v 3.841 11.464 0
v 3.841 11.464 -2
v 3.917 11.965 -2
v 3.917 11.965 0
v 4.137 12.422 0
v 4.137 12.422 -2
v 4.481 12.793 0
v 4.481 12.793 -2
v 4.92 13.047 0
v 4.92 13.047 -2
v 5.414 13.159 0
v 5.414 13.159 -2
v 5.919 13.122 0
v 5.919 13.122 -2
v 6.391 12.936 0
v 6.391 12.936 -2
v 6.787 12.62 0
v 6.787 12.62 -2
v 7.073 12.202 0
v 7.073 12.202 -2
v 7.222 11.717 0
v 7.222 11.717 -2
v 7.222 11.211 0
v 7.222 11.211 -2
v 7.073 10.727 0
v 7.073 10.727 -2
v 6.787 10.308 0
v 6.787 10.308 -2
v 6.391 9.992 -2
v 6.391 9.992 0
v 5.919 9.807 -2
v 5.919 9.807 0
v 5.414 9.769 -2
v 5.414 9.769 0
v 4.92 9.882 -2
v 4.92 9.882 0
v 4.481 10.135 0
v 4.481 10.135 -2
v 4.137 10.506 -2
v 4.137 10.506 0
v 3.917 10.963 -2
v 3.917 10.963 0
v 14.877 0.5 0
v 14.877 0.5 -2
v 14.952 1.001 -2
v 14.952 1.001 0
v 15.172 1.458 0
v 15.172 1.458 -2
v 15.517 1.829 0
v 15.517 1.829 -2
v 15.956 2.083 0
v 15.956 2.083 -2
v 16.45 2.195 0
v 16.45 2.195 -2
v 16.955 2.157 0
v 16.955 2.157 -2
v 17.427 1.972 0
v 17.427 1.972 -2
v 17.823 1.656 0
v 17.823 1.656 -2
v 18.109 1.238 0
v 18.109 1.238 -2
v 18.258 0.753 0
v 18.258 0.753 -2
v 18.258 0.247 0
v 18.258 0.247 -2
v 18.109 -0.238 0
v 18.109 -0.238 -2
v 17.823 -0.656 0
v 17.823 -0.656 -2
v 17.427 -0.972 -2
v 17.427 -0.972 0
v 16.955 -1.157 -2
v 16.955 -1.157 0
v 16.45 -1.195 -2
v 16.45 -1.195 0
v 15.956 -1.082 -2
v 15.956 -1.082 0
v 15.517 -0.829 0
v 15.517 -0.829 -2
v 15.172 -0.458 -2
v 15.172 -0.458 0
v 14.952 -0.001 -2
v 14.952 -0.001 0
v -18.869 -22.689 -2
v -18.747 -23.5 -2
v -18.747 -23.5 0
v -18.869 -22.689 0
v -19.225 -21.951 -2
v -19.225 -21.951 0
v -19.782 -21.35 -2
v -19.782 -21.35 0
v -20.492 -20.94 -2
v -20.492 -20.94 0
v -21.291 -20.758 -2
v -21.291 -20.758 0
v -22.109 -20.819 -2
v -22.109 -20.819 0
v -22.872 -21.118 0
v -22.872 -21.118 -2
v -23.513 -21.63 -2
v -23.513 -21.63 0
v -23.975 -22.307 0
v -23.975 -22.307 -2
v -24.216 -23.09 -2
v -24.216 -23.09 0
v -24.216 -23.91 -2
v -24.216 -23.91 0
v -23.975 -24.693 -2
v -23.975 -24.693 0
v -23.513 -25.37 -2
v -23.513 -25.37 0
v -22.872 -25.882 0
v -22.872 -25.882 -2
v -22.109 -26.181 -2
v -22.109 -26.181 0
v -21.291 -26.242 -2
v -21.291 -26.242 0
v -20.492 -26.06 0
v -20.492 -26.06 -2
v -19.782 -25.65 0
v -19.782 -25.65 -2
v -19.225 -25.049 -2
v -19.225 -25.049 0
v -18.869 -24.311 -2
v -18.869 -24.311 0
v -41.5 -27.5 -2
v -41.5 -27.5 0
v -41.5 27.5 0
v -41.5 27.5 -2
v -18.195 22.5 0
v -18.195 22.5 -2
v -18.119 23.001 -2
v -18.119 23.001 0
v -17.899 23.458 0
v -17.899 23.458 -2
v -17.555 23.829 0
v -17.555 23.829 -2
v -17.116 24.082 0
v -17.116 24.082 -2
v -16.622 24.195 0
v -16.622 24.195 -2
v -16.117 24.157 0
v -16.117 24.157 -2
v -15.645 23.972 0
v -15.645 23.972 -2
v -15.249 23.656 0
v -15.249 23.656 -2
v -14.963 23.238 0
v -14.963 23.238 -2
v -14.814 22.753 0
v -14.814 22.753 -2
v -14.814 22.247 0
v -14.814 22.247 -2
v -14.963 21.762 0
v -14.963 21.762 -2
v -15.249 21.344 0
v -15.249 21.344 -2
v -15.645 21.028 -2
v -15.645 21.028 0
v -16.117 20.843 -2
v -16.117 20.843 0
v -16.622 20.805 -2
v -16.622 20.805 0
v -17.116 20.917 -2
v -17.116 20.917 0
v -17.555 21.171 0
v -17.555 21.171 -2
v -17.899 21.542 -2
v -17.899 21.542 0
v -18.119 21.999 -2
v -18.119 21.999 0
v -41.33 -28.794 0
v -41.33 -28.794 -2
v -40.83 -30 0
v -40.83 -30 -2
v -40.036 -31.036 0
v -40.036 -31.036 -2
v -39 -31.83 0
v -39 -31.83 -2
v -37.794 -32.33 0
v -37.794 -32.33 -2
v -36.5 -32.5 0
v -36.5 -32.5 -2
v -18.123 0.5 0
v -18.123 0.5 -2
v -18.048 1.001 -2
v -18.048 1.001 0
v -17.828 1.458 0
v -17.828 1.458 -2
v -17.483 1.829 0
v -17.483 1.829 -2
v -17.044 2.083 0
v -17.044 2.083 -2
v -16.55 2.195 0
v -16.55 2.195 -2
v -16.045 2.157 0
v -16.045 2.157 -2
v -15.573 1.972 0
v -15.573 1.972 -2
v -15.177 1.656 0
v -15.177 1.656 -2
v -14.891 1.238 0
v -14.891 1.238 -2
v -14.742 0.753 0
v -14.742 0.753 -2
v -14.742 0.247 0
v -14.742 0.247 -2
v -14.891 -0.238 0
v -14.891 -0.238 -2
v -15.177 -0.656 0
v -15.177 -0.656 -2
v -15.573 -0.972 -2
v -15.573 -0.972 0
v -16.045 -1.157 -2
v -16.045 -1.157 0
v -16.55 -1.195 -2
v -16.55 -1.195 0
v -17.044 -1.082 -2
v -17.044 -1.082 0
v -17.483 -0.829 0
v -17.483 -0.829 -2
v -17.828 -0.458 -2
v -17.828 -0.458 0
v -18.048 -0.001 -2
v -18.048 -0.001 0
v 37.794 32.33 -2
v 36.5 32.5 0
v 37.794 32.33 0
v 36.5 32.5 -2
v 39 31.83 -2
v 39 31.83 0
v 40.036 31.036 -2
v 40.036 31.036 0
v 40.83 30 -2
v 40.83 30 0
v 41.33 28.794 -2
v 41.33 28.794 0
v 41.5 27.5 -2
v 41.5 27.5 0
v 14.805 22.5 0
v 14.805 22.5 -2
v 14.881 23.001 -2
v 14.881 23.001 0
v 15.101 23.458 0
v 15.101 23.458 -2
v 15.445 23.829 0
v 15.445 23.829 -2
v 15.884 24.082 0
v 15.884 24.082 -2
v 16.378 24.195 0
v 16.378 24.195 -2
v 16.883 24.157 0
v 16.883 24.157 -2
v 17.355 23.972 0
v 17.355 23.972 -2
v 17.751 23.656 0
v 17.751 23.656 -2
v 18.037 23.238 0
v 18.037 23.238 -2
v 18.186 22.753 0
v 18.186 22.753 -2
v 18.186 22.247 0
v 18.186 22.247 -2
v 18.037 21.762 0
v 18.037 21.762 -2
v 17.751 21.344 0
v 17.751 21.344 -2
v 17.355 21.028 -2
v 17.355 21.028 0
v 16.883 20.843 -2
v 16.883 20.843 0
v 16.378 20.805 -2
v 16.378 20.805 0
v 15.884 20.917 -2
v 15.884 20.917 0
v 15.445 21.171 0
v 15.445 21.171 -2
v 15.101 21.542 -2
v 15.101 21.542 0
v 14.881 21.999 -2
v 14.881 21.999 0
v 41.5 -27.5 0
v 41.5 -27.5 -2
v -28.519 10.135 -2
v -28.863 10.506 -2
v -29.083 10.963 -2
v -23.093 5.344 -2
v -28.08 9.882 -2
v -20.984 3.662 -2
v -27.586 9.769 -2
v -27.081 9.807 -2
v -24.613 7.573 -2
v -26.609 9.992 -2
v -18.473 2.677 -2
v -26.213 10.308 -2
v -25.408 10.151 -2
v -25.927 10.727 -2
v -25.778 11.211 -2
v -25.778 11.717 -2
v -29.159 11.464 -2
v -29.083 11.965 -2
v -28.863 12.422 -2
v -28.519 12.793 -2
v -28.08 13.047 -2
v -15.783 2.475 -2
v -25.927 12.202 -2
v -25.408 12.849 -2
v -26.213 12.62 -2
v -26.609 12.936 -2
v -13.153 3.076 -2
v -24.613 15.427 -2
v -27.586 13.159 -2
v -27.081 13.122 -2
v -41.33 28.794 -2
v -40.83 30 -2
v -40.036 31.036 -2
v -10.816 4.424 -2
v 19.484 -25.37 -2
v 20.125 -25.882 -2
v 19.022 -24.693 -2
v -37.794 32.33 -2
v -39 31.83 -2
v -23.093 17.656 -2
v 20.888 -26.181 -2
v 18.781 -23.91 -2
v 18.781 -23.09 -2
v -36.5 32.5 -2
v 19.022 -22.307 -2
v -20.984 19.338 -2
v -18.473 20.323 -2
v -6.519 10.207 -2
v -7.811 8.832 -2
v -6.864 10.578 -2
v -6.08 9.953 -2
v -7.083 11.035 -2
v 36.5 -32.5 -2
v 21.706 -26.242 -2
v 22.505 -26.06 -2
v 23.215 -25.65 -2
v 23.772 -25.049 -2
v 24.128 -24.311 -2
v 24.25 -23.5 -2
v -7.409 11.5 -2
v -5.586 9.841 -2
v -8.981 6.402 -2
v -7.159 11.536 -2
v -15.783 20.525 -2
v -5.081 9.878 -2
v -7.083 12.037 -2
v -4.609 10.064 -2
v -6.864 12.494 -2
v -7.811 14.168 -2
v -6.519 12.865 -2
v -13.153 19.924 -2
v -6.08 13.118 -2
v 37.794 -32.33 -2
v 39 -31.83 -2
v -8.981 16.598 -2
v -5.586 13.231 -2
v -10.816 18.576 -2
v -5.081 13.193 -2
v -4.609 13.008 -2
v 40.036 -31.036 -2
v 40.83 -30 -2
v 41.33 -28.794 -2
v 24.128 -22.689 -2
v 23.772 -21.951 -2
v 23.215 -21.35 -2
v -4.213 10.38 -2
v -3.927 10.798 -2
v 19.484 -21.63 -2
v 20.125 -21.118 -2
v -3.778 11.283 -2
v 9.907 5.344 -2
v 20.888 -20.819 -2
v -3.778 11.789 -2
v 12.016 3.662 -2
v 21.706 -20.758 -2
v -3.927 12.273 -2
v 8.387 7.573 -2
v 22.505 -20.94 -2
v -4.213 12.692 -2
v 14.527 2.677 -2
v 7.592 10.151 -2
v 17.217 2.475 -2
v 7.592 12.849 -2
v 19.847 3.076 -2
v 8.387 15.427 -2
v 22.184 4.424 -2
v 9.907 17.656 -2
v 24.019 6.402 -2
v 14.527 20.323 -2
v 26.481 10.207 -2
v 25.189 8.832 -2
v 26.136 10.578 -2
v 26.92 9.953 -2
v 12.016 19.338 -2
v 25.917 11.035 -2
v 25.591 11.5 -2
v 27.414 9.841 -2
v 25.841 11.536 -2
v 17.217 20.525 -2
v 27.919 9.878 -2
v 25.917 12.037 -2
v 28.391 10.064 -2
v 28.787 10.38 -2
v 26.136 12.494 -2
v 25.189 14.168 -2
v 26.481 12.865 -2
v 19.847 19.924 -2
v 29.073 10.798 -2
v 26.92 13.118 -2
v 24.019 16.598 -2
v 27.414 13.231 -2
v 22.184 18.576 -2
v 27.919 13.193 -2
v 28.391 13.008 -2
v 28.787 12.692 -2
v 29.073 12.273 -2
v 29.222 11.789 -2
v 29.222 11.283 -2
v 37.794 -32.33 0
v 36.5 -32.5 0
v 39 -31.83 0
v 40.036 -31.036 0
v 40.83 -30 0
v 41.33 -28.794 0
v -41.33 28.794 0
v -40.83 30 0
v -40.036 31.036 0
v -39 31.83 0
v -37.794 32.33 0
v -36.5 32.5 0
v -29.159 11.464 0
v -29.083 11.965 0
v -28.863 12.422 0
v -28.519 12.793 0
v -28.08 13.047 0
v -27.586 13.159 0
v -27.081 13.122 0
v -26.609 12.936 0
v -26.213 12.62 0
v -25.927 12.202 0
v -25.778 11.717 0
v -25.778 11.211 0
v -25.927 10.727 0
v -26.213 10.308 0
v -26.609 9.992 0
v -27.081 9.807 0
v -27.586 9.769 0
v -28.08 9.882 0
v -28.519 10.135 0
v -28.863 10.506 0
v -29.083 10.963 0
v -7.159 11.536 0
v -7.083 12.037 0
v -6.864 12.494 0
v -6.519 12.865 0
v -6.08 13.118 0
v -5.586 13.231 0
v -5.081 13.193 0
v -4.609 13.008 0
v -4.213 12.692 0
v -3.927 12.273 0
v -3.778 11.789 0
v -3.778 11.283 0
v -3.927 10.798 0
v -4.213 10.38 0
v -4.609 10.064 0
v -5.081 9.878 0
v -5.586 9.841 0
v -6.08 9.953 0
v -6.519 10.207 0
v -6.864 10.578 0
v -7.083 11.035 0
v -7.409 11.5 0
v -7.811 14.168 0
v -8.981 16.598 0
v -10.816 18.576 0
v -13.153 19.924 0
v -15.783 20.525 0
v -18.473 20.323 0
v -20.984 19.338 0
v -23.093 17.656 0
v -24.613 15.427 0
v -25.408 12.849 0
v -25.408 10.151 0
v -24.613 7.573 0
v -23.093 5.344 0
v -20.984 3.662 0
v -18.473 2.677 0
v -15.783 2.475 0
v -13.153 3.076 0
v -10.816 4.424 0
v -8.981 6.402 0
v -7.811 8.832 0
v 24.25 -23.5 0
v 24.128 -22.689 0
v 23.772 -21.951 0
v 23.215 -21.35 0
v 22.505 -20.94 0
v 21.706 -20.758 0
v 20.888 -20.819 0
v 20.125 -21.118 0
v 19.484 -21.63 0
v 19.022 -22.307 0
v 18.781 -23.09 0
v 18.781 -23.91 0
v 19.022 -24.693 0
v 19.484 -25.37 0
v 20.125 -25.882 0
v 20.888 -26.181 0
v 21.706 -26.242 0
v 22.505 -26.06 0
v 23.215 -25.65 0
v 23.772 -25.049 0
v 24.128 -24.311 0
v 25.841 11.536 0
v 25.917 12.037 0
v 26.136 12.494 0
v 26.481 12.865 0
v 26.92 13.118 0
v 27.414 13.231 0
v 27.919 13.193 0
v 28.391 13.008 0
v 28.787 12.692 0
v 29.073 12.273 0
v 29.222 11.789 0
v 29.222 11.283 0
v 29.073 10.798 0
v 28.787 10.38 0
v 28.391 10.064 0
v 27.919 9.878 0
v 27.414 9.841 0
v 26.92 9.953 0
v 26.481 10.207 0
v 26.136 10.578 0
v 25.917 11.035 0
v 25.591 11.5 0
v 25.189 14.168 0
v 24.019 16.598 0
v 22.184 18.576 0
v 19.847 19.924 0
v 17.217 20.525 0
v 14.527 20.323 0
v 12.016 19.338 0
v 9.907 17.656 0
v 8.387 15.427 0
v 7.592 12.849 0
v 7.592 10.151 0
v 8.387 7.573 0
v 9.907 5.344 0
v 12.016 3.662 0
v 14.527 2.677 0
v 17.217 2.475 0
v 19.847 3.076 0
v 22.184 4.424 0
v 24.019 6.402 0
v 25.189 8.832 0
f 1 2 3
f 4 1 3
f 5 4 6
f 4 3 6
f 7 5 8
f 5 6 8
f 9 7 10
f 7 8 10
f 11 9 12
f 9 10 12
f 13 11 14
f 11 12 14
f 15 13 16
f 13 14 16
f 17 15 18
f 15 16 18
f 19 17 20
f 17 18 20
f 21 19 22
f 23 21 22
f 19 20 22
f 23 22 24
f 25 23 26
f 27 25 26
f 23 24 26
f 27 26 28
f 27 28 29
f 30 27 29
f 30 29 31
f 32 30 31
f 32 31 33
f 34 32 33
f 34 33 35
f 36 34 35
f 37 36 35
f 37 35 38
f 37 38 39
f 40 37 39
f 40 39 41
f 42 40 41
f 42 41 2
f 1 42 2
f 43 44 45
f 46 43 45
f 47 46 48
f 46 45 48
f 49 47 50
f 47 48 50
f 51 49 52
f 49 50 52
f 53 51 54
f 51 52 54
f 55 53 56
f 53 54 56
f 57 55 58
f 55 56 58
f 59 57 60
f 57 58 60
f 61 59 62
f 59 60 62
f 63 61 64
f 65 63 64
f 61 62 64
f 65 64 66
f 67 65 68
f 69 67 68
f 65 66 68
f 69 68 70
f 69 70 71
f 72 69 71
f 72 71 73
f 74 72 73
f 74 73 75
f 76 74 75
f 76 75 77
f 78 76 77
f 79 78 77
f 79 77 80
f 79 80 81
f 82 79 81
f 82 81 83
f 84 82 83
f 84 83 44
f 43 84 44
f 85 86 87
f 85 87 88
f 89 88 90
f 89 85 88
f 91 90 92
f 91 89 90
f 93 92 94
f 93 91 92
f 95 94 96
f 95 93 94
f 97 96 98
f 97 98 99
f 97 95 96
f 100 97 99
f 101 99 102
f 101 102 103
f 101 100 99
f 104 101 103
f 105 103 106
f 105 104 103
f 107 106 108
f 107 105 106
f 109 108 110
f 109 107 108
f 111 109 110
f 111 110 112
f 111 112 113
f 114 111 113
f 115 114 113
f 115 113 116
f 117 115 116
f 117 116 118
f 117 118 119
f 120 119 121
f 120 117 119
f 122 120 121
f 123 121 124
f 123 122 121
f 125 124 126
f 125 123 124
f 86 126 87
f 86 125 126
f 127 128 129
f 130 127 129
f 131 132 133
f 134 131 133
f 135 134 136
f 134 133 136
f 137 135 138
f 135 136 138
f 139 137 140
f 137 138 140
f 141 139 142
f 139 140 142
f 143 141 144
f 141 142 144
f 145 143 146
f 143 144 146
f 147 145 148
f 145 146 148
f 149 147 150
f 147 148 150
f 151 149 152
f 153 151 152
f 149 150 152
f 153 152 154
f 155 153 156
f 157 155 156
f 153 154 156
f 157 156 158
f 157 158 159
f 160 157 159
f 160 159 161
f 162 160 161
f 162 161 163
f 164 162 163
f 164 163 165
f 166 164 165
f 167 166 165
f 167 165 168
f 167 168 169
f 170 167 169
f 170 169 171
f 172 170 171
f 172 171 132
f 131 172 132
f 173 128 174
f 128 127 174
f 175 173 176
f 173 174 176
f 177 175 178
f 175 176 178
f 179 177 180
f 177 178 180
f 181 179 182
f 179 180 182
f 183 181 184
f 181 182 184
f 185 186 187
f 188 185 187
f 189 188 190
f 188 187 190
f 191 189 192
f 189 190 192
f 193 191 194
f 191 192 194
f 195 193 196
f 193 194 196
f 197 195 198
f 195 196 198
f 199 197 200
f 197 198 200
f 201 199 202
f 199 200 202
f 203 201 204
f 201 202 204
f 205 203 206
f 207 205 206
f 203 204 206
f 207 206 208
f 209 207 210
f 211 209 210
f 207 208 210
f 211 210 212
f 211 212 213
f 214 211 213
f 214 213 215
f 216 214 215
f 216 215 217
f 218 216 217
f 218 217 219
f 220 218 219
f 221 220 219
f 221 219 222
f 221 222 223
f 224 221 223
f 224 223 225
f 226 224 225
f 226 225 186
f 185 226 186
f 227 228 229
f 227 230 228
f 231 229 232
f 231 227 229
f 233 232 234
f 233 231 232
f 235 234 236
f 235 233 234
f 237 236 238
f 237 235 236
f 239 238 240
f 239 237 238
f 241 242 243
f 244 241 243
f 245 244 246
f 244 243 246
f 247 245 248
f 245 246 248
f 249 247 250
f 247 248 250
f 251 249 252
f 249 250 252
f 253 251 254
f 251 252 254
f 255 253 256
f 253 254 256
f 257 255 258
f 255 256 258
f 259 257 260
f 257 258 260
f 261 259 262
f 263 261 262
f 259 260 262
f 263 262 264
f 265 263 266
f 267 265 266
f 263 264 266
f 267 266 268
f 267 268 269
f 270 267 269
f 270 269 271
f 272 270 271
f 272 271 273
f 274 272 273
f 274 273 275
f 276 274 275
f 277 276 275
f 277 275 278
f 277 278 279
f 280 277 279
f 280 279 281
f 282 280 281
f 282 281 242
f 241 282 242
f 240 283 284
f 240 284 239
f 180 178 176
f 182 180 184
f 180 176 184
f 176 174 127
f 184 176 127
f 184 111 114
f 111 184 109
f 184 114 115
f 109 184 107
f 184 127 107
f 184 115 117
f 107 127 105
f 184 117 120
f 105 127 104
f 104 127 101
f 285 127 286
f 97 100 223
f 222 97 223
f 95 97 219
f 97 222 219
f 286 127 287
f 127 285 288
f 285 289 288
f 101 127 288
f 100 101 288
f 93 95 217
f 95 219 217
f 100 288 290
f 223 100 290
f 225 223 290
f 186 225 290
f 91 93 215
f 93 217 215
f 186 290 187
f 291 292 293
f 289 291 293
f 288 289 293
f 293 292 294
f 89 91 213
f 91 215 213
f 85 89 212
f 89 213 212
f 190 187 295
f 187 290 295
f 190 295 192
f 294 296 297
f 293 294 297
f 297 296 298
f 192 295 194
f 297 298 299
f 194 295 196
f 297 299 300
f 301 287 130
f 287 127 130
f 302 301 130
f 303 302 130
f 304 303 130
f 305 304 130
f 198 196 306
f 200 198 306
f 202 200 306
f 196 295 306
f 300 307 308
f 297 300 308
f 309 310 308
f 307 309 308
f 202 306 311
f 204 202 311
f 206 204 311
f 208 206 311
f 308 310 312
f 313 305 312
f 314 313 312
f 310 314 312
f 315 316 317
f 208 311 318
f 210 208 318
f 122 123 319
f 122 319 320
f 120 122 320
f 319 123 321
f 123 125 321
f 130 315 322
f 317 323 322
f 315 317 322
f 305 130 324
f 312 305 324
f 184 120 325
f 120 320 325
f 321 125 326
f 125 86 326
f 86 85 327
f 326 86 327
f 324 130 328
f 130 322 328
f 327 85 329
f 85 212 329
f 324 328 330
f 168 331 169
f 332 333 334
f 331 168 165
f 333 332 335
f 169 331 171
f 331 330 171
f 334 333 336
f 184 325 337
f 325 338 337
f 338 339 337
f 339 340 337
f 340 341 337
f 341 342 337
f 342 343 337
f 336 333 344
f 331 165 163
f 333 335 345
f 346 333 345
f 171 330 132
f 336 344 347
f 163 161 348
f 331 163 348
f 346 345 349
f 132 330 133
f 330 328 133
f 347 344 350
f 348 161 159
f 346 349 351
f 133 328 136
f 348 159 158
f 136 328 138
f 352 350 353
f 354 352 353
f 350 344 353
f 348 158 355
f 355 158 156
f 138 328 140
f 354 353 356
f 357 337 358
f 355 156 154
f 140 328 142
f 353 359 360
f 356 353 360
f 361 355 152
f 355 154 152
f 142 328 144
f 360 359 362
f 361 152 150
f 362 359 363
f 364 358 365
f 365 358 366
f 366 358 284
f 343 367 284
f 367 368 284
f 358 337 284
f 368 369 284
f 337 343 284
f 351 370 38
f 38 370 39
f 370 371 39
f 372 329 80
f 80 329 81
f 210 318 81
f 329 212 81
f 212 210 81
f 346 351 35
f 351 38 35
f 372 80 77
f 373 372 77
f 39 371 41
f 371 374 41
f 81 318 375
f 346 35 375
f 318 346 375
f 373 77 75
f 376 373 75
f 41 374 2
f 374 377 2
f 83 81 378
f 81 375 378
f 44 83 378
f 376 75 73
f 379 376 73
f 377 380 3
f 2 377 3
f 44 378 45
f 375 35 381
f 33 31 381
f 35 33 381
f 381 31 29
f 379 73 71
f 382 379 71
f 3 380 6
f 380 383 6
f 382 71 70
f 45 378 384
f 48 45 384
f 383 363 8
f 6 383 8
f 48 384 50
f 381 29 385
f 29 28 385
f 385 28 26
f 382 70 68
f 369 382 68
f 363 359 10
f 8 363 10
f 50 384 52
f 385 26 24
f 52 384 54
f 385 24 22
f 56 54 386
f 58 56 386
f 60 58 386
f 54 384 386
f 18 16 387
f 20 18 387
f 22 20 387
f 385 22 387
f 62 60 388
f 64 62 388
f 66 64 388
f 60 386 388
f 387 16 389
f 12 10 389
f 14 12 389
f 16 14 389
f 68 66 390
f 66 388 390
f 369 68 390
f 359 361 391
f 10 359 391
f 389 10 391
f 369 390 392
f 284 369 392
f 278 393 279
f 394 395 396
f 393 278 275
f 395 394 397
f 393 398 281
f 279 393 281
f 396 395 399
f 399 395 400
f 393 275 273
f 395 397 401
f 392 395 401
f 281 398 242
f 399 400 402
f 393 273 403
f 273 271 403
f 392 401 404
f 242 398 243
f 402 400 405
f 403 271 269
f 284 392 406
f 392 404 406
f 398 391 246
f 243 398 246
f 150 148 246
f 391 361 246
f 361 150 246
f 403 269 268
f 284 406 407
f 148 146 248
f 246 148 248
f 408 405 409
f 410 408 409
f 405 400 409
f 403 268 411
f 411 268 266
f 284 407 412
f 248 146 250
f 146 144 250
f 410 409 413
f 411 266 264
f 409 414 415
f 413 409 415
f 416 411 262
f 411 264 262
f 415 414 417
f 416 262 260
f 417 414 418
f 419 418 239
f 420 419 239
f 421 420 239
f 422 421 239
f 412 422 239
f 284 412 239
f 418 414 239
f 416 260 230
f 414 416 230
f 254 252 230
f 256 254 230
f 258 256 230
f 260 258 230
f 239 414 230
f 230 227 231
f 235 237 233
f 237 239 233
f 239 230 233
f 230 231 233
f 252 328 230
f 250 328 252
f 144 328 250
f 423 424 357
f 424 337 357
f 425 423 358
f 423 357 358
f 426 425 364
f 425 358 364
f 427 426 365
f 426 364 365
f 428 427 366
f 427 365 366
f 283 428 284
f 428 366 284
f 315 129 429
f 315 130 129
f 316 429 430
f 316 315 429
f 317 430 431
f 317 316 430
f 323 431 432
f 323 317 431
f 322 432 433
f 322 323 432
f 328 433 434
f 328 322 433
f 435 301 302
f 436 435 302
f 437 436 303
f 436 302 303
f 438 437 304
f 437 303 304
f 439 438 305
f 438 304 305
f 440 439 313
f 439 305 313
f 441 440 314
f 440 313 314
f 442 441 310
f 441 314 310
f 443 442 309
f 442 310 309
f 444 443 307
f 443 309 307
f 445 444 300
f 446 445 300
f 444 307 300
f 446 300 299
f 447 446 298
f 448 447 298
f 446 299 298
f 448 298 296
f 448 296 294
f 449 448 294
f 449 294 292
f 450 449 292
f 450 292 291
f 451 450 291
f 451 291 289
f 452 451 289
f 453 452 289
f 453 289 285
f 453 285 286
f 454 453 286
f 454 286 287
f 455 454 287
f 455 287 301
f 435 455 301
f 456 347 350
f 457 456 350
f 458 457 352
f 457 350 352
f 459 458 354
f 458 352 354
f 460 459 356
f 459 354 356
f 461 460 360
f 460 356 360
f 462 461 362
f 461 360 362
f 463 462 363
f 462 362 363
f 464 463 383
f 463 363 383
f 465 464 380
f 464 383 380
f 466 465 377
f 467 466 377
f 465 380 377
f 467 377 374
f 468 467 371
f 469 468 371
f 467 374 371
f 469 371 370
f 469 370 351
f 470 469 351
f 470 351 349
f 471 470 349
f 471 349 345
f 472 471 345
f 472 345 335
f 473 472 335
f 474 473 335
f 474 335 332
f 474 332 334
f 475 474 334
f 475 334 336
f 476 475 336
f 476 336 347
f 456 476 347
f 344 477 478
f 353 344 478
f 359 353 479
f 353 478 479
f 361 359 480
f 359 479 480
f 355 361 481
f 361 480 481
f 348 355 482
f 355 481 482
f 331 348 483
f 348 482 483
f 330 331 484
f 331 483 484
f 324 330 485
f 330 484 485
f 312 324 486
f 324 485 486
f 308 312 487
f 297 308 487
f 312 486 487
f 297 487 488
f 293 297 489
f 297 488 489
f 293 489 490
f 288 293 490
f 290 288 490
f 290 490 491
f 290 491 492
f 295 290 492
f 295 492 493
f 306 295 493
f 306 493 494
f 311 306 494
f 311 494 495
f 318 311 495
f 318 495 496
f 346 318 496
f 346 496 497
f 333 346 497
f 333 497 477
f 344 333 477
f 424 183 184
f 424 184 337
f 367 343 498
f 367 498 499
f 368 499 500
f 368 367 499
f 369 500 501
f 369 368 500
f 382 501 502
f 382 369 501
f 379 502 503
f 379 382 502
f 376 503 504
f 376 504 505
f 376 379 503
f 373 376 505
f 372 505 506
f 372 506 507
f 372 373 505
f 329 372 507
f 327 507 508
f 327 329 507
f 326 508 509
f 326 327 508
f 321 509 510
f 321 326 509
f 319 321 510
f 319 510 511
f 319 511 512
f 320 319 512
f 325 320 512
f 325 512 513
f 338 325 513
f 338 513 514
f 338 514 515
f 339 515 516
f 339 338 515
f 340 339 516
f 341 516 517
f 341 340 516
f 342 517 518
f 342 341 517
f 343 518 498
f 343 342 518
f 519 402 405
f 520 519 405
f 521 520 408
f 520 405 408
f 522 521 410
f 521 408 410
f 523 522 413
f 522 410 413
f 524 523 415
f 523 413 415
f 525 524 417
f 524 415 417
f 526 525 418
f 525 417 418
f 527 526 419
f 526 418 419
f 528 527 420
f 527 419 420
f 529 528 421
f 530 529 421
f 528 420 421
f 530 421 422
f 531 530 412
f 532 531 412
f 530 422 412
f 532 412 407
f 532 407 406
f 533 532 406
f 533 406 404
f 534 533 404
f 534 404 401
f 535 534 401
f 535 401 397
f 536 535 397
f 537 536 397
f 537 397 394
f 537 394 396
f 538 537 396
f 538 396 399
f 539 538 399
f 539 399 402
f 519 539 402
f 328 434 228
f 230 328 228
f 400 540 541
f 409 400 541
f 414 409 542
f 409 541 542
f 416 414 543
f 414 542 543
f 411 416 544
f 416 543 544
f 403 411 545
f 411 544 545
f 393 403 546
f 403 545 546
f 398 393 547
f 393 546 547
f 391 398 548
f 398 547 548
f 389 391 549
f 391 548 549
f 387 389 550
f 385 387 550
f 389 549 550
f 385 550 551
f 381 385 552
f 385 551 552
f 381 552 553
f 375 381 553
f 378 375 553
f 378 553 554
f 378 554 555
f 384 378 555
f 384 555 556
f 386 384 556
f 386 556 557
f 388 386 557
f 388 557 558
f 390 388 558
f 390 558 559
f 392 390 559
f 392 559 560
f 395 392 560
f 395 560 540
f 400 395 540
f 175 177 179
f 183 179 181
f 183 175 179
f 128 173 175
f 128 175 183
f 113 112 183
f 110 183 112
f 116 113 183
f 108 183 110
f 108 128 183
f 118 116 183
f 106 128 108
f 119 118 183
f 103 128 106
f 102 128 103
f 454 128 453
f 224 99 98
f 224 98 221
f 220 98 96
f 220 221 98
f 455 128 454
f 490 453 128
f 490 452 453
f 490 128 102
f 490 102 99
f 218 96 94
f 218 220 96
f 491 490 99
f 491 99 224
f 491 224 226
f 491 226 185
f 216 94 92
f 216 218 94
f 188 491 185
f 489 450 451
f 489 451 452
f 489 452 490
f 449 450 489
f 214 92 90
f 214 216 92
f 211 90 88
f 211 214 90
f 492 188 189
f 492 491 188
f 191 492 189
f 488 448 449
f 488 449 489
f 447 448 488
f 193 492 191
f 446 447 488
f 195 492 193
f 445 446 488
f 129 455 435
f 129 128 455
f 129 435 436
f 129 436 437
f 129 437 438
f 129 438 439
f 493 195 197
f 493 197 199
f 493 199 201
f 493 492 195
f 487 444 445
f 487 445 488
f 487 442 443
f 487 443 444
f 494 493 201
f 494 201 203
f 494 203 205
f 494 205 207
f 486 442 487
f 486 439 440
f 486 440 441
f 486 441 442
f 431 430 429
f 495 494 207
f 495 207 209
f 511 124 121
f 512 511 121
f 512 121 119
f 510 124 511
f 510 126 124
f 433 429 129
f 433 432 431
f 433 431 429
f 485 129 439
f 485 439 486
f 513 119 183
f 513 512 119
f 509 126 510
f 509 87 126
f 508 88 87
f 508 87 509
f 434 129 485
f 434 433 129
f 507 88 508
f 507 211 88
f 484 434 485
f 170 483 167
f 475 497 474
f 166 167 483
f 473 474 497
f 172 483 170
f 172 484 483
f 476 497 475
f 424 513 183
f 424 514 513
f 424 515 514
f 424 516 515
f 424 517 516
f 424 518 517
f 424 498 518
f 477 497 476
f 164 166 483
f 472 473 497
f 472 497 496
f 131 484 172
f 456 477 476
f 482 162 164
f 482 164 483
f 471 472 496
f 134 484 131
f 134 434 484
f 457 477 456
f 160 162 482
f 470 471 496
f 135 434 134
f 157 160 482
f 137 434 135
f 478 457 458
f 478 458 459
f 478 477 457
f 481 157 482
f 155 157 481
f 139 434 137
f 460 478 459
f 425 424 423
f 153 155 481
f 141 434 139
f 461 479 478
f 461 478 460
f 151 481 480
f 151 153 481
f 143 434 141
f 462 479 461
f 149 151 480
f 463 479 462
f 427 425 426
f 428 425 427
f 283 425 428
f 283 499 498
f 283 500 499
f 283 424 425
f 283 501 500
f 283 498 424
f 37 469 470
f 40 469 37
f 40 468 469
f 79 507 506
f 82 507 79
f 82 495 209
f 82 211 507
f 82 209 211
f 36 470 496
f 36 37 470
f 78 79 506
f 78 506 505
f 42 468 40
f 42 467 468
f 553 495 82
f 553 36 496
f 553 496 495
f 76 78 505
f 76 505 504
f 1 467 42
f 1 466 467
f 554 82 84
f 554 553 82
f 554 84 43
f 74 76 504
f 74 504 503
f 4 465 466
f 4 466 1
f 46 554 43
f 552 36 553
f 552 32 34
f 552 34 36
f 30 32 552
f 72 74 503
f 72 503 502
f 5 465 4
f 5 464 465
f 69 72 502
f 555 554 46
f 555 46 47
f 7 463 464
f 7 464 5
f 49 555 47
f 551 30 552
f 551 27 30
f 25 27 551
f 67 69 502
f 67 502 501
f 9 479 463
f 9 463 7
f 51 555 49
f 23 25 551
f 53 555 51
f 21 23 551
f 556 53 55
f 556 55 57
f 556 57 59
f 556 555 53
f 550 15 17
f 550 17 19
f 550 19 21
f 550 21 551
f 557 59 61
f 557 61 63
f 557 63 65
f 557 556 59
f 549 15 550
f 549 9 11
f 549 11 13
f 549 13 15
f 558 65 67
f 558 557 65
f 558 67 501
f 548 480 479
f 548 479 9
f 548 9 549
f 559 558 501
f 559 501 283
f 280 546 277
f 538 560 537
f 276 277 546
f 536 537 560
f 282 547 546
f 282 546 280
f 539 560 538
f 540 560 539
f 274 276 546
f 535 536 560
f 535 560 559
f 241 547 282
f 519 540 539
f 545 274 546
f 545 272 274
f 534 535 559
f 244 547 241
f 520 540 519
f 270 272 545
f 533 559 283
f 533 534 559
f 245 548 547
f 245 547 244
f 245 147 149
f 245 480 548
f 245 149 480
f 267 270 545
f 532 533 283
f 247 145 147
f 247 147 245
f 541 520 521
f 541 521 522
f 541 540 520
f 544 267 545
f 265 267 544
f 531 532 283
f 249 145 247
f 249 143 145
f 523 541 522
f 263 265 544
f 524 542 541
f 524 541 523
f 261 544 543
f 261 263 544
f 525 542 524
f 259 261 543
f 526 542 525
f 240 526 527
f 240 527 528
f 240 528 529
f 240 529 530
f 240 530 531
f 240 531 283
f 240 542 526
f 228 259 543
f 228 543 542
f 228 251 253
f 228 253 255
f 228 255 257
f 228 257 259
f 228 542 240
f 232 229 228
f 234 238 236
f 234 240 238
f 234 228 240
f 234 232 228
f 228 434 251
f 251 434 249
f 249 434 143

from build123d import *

# Parameters (mm, degrees)
SKETCH1_W               = 83
SKETCH1_H               = 65
BASE_FLANGE1_DEPTH      = 2
SKETCH6_R               = 9.05
CUT_EXTRUDE1_DEPTH      = 12
M3_CLEARANCE_HOLE1_D    = 3.4
LPATTERN1_COUNT         = 2
LPATTERN1_PITCH         = 33
FILLET1_R               = 5
FLAT_PATTERN1_START     = -2
FLAT_PATTERN1_OUTLINE_R = 2.75
FLAT_PATTERN1_DEPTH     = 2


# Read off the part's stored shape, not the designer's step: Flat-Pattern1
# Sheet-metal steps are written as plain solids
with BuildPart() as part:
    # Sketch1 → Base-Flange1 (new body)
    with BuildSketch(Plane.XY):
        Rectangle(SKETCH1_W, SKETCH1_H)
    extrude(amount=-BASE_FLANGE1_DEPTH)

    # Sketch6 → Cut-Extrude1 (cut)
    with BuildSketch(Plane.XY):
        with Locations((16.541079456, 11.5)):
            Circle(SKETCH6_R)
        with Locations((-16.458920544, 11.5)):
            Circle(SKETCH6_R)
    extrude(amount=-CUT_EXTRUDE1_DEPTH, mode=Mode.SUBTRACT)

    # M3 Clearance Hole1 (through all)
    with Locations(Plane.XY):
        with Locations((16.50520677, 22.499941507), (27.541020963, 11.535872686), (5.541137949, 11.464127314), (16.576952141, 0.500058493)):
            m3_clearance_hole1 = Hole(M3_CLEARANCE_HOLE1_D / 2)

    # LPattern1: M3 Clearance Hole1 ×2
    with Locations(*[(-i * LPATTERN1_PITCH, 0, 0) for i in range(1, LPATTERN1_COUNT)]):
        add(m3_clearance_hole1, mode=Mode.SUBTRACT)

    # Fillet1
    fillet1_edges = [part.edges().sort_by_distance(p)[0] for p in [
        (41.5, -32.5, -1),
        (-41.5, -32.5, -1),
        (-41.5, 32.5, -1),
        (41.5, 32.5, -1),
    ]]
    fillet(fillet1_edges, radius=FILLET1_R)

    # Flat-Pattern1 outline → Flat-Pattern1 (cut)
    with BuildSketch(Plane.XY.offset(FLAT_PATTERN1_START)):
        with Locations((-21.496938457, -23.5)):
            Circle(FLAT_PATTERN1_OUTLINE_R)
        with Locations((21.5, -23.5)):
            Circle(FLAT_PATTERN1_OUTLINE_R)
    extrude(amount=FLAT_PATTERN1_DEPTH, mode=Mode.SUBTRACT)


solid = part.part
